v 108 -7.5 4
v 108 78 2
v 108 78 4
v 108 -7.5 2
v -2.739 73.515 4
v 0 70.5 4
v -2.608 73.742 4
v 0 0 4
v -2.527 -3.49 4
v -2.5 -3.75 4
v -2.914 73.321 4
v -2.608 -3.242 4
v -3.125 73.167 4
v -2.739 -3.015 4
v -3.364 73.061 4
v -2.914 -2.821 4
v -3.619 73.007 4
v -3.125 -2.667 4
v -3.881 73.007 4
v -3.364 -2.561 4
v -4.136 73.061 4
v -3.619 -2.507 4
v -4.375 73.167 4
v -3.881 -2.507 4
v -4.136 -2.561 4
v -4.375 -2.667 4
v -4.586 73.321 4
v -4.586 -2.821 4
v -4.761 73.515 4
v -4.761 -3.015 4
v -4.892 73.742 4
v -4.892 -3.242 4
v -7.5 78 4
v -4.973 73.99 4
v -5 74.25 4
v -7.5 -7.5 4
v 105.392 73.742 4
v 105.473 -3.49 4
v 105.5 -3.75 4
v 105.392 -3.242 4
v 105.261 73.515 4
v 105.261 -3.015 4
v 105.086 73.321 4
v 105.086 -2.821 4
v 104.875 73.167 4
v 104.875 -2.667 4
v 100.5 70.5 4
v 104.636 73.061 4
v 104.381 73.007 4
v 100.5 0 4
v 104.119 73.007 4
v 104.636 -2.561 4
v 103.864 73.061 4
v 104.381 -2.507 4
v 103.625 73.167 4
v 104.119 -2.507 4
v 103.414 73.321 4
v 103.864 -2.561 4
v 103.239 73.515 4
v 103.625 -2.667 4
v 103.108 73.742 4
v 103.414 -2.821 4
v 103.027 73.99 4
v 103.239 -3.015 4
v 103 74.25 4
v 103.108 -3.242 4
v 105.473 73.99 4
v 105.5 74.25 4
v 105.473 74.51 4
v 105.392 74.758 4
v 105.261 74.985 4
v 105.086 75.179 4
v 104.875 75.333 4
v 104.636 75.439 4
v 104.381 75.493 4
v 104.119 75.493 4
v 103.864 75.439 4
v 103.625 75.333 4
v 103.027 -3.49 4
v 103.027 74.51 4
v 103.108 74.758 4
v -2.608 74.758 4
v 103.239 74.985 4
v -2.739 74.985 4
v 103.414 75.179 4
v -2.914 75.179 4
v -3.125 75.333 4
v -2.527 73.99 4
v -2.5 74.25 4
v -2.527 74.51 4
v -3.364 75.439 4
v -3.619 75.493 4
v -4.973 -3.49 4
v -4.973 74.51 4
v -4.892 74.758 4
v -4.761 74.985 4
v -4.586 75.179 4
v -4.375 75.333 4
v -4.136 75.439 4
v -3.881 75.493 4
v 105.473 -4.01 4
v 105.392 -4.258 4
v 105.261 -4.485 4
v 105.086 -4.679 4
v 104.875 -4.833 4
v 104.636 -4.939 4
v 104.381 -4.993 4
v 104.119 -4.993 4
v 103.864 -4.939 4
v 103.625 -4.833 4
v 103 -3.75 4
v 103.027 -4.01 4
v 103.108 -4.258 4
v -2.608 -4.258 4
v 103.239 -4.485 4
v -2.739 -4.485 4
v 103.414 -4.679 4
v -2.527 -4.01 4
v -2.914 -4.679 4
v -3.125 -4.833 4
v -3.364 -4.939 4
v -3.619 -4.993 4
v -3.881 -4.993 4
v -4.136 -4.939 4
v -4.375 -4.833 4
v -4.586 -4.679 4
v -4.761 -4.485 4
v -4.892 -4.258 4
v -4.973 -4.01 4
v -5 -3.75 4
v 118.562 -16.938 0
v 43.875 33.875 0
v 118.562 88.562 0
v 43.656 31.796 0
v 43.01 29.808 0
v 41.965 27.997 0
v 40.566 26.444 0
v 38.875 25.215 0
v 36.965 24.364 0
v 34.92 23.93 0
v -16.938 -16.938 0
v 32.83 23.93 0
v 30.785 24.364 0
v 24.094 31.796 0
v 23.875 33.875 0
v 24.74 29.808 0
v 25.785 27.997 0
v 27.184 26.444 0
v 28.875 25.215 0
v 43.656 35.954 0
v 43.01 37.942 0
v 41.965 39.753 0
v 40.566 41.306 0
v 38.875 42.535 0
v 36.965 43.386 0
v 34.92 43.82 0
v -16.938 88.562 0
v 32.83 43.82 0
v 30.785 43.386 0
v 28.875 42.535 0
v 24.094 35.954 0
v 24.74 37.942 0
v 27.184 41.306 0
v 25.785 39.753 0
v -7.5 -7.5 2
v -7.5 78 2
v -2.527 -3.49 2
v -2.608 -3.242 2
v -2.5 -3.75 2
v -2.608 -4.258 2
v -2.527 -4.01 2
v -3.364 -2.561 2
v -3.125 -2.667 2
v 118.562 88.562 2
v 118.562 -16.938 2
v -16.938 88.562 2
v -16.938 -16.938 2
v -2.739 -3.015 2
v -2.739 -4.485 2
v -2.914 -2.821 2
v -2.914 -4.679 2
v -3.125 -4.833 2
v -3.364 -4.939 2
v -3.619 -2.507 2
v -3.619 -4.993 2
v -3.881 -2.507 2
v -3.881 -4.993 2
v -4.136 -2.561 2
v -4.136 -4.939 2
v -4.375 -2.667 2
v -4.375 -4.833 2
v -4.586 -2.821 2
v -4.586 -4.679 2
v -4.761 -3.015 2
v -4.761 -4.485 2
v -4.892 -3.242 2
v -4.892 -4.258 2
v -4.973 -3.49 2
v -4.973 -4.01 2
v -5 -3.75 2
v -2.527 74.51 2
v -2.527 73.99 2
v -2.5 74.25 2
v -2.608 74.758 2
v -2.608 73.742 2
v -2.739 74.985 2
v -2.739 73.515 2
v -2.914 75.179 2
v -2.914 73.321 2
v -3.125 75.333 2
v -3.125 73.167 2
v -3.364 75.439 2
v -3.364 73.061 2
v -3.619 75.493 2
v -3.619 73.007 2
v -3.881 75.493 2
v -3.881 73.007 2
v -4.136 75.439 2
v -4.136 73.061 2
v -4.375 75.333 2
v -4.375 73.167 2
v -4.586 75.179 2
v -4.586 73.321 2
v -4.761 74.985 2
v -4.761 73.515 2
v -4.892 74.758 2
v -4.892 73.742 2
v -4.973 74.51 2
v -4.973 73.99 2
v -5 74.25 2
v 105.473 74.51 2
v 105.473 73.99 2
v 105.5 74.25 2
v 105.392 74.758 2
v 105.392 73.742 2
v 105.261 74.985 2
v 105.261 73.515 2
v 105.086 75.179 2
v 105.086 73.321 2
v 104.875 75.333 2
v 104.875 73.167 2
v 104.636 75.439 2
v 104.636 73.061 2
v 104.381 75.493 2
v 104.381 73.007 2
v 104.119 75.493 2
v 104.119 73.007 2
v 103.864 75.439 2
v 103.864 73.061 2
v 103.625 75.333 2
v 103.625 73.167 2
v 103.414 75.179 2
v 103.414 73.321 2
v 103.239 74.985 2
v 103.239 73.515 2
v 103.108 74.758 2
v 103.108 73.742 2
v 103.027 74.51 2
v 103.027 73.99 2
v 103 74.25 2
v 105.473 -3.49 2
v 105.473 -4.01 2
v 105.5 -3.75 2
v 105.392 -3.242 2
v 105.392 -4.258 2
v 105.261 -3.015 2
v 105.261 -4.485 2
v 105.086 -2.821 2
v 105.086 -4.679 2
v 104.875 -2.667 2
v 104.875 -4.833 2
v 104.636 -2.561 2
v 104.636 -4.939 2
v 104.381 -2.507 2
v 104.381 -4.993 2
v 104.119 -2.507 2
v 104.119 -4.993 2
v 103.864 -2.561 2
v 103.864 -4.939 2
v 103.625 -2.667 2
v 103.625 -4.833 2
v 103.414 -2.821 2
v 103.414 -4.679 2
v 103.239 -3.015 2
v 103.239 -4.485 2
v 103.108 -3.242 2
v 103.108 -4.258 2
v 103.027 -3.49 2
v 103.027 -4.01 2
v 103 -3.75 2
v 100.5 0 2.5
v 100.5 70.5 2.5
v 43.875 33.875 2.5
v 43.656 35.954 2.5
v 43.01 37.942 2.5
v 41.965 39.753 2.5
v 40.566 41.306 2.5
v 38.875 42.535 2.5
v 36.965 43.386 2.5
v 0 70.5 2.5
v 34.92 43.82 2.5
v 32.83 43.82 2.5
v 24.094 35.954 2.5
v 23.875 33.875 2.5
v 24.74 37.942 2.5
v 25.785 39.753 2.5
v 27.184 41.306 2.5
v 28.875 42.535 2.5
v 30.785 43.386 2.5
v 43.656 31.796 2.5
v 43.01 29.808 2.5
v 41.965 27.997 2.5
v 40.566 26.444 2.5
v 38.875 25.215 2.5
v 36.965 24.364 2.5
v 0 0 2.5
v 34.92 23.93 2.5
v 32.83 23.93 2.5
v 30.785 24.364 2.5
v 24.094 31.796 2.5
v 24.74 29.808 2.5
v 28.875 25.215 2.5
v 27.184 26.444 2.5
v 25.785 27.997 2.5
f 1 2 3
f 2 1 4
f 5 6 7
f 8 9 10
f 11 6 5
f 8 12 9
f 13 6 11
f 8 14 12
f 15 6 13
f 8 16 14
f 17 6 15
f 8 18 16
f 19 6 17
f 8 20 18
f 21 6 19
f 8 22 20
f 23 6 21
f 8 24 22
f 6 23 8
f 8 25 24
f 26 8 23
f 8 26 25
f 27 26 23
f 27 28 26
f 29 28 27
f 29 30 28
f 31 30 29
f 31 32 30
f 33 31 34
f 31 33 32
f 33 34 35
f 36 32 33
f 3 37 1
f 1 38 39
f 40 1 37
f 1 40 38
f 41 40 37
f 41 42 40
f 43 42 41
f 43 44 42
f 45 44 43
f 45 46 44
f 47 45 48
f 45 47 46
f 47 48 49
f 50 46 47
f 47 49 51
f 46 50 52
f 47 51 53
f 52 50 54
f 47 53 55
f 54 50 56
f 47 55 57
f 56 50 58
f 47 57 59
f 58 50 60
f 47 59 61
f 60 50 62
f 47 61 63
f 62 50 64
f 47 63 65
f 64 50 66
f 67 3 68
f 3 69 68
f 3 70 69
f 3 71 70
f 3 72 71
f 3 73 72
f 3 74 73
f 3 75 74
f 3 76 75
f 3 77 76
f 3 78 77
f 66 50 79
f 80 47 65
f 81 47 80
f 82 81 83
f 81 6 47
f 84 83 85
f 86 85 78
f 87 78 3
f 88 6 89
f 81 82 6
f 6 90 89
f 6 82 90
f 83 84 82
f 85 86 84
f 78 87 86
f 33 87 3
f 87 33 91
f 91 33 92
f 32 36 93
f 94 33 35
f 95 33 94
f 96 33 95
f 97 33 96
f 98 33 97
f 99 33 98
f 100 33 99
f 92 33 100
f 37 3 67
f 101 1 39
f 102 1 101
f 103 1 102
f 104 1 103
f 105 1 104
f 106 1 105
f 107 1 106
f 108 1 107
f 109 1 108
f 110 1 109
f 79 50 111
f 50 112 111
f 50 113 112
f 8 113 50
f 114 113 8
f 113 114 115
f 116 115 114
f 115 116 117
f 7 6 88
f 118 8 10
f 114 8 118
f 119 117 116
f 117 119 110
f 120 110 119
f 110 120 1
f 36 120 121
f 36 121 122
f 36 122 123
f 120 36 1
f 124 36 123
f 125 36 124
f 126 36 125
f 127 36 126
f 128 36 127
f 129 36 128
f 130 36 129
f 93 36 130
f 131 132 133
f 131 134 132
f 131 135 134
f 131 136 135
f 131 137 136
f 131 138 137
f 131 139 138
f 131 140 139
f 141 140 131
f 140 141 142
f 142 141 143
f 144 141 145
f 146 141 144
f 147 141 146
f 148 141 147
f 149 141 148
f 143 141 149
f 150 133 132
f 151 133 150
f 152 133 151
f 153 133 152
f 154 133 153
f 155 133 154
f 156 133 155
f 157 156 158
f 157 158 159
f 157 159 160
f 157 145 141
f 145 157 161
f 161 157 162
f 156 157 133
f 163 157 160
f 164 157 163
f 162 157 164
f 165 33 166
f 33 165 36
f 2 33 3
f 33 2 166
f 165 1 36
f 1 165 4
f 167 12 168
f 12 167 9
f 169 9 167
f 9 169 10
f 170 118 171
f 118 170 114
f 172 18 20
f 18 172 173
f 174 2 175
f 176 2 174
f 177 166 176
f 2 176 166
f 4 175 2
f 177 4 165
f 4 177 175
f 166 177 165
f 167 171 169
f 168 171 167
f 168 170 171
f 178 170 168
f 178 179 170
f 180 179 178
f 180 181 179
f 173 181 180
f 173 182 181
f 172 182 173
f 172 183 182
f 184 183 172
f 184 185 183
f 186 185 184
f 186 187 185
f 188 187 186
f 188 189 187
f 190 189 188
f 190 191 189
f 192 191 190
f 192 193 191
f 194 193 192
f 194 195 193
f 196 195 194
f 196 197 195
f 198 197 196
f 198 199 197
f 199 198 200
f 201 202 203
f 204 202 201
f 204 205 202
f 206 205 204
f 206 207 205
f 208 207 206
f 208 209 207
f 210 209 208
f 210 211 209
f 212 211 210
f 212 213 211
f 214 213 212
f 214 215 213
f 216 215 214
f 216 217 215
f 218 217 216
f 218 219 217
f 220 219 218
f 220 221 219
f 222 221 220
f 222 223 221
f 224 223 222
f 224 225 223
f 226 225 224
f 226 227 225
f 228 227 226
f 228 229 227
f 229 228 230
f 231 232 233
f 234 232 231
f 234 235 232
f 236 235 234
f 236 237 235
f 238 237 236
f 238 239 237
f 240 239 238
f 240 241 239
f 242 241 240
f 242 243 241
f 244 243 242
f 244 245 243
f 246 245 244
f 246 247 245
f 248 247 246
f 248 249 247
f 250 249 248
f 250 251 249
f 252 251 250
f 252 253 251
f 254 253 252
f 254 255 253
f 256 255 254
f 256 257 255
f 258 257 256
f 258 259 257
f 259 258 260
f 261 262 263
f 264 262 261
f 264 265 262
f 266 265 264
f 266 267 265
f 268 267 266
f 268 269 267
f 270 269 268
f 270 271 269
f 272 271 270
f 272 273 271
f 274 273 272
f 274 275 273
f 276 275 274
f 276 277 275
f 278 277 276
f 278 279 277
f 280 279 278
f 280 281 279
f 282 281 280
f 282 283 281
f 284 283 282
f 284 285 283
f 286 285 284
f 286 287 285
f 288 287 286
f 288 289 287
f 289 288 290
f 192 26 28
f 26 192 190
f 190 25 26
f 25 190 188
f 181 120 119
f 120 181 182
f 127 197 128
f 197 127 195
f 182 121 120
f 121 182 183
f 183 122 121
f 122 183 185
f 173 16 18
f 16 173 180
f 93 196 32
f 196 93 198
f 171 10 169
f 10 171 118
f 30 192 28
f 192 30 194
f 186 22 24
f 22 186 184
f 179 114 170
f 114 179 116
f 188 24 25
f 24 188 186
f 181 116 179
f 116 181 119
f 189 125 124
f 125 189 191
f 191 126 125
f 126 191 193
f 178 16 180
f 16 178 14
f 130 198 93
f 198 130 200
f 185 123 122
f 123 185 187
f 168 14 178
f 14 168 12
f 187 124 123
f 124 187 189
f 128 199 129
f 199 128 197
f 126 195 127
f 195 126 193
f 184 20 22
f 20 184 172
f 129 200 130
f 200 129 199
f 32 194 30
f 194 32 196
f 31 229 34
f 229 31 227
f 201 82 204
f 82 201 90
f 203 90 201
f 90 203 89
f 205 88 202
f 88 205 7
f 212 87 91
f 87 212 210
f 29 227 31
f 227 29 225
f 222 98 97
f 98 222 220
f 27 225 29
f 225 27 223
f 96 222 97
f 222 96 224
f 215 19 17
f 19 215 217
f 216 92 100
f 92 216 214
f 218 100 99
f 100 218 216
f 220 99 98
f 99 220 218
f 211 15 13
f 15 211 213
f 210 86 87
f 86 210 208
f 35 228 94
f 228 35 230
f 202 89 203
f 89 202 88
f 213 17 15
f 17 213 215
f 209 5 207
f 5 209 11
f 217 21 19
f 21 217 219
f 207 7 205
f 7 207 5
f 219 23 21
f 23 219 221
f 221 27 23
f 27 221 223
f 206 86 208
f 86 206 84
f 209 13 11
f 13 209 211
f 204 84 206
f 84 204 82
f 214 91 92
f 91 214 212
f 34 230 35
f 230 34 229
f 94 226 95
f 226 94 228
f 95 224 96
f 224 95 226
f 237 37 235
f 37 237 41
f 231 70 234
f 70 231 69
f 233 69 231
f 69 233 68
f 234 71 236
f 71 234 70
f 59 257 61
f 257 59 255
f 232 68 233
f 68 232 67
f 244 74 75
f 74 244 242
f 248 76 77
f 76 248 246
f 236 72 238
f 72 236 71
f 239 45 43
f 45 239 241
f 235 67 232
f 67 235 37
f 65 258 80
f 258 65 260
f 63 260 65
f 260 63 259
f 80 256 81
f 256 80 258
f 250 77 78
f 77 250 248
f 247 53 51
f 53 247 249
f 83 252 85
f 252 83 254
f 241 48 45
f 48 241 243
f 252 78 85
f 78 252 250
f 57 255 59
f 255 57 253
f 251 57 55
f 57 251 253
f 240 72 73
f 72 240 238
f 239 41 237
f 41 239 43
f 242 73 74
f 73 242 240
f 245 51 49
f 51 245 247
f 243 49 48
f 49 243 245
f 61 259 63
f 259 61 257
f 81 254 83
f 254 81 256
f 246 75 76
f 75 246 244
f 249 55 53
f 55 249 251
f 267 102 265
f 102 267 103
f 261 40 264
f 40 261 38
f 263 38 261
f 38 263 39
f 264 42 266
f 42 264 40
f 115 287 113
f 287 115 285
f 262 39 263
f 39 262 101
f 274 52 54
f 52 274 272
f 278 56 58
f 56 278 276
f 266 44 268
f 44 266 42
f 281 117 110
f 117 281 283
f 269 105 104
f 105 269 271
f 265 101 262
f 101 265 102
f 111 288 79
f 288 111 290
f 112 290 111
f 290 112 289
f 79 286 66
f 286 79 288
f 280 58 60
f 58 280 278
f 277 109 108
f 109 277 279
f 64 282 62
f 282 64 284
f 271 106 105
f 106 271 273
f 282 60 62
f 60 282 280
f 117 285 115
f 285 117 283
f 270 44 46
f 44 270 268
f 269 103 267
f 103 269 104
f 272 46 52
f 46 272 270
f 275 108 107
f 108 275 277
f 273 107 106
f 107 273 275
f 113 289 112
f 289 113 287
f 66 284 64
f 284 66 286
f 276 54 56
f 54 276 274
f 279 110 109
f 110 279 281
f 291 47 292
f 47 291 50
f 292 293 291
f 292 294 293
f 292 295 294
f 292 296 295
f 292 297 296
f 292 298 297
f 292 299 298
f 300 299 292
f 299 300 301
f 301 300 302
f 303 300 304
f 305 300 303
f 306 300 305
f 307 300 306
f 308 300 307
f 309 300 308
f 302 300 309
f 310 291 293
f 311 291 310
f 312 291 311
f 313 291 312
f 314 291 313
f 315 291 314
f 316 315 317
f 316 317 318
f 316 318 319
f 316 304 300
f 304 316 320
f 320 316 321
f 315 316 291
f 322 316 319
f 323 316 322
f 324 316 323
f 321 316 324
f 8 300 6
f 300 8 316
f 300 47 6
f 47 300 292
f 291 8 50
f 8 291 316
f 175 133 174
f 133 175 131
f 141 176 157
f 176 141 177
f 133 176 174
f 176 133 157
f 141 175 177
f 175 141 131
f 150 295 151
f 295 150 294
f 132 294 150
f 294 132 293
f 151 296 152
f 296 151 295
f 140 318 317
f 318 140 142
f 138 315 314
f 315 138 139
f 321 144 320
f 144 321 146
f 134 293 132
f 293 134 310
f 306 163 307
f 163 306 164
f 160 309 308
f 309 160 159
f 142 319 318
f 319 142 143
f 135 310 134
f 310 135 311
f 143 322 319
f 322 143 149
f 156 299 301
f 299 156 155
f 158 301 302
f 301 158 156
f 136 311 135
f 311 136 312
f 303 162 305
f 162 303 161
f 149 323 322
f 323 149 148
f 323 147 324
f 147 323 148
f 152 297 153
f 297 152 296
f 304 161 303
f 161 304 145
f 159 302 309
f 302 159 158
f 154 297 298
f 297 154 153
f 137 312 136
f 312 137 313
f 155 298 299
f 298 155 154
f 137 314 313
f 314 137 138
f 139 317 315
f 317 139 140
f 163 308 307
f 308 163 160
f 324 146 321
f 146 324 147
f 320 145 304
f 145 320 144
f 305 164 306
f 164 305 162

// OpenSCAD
$fn=30;
board_x = 100.5;
board_y = 70.5;
board_z = 1.5;

flat_lip_size = 10;

screw_dia = 2.5;

edge_thickness = 15;

item_height = 4;

combi_x = board_x + edge_thickness+(flat_lip_size*2);
combi_y = board_y + edge_thickness+(flat_lip_size*2);
field_thickness = 2;


module exterior()
{
    difference()
    {
    translate([-edge_thickness/2,-edge_thickness/2,0]) cube([board_x+edge_thickness,board_y+edge_thickness,item_height]);
        
    translate([-edge_thickness/4, -edge_thickness/4,item_height-(item_height/2)]) cylinder(r=screw_dia/2, h=item_height/2);
        
    translate([-edge_thickness/4, ((-edge_thickness/4)+board_y+edge_thickness/2),item_height-(item_height/2)]) cylinder(r=screw_dia/2, h=item_height/2);
        
    translate([
        (-edge_thickness/4)+board_x+edge_thickness/2,
        ((-edge_thickness/4)+board_y+edge_thickness/2),
        (item_height-(item_height/2))
        ]) 
            cylinder(r=screw_dia/2, h=item_height/2);
    translate([
        ((-edge_thickness/4)+board_x+edge_thickness/2),
        ((-edge_thickness/4)),
        (item_height-(item_height/2))
        ])
         
            cylinder(r=screw_dia/2, h=item_height/2);

    }

}

module pcb()
{
    color([1,0,0]) translate([0,0,item_height-board_z]) cube([board_x, board_y, board_z]);
}

module field()
{
    cube([combi_x,combi_y,field_thickness]);
}


module holder()
{
    union() {
    difference() {
        exterior();
        pcb();
    }
    translate([-combi_x/8,-combi_x/8])field();
}
}

module plus_fingerhole() {
    difference()
    {
        holder();
        translate([combi_x/4,combi_x/4,0])cylinder(r=10, h=10);
    }
}
plus_fingerhole();
